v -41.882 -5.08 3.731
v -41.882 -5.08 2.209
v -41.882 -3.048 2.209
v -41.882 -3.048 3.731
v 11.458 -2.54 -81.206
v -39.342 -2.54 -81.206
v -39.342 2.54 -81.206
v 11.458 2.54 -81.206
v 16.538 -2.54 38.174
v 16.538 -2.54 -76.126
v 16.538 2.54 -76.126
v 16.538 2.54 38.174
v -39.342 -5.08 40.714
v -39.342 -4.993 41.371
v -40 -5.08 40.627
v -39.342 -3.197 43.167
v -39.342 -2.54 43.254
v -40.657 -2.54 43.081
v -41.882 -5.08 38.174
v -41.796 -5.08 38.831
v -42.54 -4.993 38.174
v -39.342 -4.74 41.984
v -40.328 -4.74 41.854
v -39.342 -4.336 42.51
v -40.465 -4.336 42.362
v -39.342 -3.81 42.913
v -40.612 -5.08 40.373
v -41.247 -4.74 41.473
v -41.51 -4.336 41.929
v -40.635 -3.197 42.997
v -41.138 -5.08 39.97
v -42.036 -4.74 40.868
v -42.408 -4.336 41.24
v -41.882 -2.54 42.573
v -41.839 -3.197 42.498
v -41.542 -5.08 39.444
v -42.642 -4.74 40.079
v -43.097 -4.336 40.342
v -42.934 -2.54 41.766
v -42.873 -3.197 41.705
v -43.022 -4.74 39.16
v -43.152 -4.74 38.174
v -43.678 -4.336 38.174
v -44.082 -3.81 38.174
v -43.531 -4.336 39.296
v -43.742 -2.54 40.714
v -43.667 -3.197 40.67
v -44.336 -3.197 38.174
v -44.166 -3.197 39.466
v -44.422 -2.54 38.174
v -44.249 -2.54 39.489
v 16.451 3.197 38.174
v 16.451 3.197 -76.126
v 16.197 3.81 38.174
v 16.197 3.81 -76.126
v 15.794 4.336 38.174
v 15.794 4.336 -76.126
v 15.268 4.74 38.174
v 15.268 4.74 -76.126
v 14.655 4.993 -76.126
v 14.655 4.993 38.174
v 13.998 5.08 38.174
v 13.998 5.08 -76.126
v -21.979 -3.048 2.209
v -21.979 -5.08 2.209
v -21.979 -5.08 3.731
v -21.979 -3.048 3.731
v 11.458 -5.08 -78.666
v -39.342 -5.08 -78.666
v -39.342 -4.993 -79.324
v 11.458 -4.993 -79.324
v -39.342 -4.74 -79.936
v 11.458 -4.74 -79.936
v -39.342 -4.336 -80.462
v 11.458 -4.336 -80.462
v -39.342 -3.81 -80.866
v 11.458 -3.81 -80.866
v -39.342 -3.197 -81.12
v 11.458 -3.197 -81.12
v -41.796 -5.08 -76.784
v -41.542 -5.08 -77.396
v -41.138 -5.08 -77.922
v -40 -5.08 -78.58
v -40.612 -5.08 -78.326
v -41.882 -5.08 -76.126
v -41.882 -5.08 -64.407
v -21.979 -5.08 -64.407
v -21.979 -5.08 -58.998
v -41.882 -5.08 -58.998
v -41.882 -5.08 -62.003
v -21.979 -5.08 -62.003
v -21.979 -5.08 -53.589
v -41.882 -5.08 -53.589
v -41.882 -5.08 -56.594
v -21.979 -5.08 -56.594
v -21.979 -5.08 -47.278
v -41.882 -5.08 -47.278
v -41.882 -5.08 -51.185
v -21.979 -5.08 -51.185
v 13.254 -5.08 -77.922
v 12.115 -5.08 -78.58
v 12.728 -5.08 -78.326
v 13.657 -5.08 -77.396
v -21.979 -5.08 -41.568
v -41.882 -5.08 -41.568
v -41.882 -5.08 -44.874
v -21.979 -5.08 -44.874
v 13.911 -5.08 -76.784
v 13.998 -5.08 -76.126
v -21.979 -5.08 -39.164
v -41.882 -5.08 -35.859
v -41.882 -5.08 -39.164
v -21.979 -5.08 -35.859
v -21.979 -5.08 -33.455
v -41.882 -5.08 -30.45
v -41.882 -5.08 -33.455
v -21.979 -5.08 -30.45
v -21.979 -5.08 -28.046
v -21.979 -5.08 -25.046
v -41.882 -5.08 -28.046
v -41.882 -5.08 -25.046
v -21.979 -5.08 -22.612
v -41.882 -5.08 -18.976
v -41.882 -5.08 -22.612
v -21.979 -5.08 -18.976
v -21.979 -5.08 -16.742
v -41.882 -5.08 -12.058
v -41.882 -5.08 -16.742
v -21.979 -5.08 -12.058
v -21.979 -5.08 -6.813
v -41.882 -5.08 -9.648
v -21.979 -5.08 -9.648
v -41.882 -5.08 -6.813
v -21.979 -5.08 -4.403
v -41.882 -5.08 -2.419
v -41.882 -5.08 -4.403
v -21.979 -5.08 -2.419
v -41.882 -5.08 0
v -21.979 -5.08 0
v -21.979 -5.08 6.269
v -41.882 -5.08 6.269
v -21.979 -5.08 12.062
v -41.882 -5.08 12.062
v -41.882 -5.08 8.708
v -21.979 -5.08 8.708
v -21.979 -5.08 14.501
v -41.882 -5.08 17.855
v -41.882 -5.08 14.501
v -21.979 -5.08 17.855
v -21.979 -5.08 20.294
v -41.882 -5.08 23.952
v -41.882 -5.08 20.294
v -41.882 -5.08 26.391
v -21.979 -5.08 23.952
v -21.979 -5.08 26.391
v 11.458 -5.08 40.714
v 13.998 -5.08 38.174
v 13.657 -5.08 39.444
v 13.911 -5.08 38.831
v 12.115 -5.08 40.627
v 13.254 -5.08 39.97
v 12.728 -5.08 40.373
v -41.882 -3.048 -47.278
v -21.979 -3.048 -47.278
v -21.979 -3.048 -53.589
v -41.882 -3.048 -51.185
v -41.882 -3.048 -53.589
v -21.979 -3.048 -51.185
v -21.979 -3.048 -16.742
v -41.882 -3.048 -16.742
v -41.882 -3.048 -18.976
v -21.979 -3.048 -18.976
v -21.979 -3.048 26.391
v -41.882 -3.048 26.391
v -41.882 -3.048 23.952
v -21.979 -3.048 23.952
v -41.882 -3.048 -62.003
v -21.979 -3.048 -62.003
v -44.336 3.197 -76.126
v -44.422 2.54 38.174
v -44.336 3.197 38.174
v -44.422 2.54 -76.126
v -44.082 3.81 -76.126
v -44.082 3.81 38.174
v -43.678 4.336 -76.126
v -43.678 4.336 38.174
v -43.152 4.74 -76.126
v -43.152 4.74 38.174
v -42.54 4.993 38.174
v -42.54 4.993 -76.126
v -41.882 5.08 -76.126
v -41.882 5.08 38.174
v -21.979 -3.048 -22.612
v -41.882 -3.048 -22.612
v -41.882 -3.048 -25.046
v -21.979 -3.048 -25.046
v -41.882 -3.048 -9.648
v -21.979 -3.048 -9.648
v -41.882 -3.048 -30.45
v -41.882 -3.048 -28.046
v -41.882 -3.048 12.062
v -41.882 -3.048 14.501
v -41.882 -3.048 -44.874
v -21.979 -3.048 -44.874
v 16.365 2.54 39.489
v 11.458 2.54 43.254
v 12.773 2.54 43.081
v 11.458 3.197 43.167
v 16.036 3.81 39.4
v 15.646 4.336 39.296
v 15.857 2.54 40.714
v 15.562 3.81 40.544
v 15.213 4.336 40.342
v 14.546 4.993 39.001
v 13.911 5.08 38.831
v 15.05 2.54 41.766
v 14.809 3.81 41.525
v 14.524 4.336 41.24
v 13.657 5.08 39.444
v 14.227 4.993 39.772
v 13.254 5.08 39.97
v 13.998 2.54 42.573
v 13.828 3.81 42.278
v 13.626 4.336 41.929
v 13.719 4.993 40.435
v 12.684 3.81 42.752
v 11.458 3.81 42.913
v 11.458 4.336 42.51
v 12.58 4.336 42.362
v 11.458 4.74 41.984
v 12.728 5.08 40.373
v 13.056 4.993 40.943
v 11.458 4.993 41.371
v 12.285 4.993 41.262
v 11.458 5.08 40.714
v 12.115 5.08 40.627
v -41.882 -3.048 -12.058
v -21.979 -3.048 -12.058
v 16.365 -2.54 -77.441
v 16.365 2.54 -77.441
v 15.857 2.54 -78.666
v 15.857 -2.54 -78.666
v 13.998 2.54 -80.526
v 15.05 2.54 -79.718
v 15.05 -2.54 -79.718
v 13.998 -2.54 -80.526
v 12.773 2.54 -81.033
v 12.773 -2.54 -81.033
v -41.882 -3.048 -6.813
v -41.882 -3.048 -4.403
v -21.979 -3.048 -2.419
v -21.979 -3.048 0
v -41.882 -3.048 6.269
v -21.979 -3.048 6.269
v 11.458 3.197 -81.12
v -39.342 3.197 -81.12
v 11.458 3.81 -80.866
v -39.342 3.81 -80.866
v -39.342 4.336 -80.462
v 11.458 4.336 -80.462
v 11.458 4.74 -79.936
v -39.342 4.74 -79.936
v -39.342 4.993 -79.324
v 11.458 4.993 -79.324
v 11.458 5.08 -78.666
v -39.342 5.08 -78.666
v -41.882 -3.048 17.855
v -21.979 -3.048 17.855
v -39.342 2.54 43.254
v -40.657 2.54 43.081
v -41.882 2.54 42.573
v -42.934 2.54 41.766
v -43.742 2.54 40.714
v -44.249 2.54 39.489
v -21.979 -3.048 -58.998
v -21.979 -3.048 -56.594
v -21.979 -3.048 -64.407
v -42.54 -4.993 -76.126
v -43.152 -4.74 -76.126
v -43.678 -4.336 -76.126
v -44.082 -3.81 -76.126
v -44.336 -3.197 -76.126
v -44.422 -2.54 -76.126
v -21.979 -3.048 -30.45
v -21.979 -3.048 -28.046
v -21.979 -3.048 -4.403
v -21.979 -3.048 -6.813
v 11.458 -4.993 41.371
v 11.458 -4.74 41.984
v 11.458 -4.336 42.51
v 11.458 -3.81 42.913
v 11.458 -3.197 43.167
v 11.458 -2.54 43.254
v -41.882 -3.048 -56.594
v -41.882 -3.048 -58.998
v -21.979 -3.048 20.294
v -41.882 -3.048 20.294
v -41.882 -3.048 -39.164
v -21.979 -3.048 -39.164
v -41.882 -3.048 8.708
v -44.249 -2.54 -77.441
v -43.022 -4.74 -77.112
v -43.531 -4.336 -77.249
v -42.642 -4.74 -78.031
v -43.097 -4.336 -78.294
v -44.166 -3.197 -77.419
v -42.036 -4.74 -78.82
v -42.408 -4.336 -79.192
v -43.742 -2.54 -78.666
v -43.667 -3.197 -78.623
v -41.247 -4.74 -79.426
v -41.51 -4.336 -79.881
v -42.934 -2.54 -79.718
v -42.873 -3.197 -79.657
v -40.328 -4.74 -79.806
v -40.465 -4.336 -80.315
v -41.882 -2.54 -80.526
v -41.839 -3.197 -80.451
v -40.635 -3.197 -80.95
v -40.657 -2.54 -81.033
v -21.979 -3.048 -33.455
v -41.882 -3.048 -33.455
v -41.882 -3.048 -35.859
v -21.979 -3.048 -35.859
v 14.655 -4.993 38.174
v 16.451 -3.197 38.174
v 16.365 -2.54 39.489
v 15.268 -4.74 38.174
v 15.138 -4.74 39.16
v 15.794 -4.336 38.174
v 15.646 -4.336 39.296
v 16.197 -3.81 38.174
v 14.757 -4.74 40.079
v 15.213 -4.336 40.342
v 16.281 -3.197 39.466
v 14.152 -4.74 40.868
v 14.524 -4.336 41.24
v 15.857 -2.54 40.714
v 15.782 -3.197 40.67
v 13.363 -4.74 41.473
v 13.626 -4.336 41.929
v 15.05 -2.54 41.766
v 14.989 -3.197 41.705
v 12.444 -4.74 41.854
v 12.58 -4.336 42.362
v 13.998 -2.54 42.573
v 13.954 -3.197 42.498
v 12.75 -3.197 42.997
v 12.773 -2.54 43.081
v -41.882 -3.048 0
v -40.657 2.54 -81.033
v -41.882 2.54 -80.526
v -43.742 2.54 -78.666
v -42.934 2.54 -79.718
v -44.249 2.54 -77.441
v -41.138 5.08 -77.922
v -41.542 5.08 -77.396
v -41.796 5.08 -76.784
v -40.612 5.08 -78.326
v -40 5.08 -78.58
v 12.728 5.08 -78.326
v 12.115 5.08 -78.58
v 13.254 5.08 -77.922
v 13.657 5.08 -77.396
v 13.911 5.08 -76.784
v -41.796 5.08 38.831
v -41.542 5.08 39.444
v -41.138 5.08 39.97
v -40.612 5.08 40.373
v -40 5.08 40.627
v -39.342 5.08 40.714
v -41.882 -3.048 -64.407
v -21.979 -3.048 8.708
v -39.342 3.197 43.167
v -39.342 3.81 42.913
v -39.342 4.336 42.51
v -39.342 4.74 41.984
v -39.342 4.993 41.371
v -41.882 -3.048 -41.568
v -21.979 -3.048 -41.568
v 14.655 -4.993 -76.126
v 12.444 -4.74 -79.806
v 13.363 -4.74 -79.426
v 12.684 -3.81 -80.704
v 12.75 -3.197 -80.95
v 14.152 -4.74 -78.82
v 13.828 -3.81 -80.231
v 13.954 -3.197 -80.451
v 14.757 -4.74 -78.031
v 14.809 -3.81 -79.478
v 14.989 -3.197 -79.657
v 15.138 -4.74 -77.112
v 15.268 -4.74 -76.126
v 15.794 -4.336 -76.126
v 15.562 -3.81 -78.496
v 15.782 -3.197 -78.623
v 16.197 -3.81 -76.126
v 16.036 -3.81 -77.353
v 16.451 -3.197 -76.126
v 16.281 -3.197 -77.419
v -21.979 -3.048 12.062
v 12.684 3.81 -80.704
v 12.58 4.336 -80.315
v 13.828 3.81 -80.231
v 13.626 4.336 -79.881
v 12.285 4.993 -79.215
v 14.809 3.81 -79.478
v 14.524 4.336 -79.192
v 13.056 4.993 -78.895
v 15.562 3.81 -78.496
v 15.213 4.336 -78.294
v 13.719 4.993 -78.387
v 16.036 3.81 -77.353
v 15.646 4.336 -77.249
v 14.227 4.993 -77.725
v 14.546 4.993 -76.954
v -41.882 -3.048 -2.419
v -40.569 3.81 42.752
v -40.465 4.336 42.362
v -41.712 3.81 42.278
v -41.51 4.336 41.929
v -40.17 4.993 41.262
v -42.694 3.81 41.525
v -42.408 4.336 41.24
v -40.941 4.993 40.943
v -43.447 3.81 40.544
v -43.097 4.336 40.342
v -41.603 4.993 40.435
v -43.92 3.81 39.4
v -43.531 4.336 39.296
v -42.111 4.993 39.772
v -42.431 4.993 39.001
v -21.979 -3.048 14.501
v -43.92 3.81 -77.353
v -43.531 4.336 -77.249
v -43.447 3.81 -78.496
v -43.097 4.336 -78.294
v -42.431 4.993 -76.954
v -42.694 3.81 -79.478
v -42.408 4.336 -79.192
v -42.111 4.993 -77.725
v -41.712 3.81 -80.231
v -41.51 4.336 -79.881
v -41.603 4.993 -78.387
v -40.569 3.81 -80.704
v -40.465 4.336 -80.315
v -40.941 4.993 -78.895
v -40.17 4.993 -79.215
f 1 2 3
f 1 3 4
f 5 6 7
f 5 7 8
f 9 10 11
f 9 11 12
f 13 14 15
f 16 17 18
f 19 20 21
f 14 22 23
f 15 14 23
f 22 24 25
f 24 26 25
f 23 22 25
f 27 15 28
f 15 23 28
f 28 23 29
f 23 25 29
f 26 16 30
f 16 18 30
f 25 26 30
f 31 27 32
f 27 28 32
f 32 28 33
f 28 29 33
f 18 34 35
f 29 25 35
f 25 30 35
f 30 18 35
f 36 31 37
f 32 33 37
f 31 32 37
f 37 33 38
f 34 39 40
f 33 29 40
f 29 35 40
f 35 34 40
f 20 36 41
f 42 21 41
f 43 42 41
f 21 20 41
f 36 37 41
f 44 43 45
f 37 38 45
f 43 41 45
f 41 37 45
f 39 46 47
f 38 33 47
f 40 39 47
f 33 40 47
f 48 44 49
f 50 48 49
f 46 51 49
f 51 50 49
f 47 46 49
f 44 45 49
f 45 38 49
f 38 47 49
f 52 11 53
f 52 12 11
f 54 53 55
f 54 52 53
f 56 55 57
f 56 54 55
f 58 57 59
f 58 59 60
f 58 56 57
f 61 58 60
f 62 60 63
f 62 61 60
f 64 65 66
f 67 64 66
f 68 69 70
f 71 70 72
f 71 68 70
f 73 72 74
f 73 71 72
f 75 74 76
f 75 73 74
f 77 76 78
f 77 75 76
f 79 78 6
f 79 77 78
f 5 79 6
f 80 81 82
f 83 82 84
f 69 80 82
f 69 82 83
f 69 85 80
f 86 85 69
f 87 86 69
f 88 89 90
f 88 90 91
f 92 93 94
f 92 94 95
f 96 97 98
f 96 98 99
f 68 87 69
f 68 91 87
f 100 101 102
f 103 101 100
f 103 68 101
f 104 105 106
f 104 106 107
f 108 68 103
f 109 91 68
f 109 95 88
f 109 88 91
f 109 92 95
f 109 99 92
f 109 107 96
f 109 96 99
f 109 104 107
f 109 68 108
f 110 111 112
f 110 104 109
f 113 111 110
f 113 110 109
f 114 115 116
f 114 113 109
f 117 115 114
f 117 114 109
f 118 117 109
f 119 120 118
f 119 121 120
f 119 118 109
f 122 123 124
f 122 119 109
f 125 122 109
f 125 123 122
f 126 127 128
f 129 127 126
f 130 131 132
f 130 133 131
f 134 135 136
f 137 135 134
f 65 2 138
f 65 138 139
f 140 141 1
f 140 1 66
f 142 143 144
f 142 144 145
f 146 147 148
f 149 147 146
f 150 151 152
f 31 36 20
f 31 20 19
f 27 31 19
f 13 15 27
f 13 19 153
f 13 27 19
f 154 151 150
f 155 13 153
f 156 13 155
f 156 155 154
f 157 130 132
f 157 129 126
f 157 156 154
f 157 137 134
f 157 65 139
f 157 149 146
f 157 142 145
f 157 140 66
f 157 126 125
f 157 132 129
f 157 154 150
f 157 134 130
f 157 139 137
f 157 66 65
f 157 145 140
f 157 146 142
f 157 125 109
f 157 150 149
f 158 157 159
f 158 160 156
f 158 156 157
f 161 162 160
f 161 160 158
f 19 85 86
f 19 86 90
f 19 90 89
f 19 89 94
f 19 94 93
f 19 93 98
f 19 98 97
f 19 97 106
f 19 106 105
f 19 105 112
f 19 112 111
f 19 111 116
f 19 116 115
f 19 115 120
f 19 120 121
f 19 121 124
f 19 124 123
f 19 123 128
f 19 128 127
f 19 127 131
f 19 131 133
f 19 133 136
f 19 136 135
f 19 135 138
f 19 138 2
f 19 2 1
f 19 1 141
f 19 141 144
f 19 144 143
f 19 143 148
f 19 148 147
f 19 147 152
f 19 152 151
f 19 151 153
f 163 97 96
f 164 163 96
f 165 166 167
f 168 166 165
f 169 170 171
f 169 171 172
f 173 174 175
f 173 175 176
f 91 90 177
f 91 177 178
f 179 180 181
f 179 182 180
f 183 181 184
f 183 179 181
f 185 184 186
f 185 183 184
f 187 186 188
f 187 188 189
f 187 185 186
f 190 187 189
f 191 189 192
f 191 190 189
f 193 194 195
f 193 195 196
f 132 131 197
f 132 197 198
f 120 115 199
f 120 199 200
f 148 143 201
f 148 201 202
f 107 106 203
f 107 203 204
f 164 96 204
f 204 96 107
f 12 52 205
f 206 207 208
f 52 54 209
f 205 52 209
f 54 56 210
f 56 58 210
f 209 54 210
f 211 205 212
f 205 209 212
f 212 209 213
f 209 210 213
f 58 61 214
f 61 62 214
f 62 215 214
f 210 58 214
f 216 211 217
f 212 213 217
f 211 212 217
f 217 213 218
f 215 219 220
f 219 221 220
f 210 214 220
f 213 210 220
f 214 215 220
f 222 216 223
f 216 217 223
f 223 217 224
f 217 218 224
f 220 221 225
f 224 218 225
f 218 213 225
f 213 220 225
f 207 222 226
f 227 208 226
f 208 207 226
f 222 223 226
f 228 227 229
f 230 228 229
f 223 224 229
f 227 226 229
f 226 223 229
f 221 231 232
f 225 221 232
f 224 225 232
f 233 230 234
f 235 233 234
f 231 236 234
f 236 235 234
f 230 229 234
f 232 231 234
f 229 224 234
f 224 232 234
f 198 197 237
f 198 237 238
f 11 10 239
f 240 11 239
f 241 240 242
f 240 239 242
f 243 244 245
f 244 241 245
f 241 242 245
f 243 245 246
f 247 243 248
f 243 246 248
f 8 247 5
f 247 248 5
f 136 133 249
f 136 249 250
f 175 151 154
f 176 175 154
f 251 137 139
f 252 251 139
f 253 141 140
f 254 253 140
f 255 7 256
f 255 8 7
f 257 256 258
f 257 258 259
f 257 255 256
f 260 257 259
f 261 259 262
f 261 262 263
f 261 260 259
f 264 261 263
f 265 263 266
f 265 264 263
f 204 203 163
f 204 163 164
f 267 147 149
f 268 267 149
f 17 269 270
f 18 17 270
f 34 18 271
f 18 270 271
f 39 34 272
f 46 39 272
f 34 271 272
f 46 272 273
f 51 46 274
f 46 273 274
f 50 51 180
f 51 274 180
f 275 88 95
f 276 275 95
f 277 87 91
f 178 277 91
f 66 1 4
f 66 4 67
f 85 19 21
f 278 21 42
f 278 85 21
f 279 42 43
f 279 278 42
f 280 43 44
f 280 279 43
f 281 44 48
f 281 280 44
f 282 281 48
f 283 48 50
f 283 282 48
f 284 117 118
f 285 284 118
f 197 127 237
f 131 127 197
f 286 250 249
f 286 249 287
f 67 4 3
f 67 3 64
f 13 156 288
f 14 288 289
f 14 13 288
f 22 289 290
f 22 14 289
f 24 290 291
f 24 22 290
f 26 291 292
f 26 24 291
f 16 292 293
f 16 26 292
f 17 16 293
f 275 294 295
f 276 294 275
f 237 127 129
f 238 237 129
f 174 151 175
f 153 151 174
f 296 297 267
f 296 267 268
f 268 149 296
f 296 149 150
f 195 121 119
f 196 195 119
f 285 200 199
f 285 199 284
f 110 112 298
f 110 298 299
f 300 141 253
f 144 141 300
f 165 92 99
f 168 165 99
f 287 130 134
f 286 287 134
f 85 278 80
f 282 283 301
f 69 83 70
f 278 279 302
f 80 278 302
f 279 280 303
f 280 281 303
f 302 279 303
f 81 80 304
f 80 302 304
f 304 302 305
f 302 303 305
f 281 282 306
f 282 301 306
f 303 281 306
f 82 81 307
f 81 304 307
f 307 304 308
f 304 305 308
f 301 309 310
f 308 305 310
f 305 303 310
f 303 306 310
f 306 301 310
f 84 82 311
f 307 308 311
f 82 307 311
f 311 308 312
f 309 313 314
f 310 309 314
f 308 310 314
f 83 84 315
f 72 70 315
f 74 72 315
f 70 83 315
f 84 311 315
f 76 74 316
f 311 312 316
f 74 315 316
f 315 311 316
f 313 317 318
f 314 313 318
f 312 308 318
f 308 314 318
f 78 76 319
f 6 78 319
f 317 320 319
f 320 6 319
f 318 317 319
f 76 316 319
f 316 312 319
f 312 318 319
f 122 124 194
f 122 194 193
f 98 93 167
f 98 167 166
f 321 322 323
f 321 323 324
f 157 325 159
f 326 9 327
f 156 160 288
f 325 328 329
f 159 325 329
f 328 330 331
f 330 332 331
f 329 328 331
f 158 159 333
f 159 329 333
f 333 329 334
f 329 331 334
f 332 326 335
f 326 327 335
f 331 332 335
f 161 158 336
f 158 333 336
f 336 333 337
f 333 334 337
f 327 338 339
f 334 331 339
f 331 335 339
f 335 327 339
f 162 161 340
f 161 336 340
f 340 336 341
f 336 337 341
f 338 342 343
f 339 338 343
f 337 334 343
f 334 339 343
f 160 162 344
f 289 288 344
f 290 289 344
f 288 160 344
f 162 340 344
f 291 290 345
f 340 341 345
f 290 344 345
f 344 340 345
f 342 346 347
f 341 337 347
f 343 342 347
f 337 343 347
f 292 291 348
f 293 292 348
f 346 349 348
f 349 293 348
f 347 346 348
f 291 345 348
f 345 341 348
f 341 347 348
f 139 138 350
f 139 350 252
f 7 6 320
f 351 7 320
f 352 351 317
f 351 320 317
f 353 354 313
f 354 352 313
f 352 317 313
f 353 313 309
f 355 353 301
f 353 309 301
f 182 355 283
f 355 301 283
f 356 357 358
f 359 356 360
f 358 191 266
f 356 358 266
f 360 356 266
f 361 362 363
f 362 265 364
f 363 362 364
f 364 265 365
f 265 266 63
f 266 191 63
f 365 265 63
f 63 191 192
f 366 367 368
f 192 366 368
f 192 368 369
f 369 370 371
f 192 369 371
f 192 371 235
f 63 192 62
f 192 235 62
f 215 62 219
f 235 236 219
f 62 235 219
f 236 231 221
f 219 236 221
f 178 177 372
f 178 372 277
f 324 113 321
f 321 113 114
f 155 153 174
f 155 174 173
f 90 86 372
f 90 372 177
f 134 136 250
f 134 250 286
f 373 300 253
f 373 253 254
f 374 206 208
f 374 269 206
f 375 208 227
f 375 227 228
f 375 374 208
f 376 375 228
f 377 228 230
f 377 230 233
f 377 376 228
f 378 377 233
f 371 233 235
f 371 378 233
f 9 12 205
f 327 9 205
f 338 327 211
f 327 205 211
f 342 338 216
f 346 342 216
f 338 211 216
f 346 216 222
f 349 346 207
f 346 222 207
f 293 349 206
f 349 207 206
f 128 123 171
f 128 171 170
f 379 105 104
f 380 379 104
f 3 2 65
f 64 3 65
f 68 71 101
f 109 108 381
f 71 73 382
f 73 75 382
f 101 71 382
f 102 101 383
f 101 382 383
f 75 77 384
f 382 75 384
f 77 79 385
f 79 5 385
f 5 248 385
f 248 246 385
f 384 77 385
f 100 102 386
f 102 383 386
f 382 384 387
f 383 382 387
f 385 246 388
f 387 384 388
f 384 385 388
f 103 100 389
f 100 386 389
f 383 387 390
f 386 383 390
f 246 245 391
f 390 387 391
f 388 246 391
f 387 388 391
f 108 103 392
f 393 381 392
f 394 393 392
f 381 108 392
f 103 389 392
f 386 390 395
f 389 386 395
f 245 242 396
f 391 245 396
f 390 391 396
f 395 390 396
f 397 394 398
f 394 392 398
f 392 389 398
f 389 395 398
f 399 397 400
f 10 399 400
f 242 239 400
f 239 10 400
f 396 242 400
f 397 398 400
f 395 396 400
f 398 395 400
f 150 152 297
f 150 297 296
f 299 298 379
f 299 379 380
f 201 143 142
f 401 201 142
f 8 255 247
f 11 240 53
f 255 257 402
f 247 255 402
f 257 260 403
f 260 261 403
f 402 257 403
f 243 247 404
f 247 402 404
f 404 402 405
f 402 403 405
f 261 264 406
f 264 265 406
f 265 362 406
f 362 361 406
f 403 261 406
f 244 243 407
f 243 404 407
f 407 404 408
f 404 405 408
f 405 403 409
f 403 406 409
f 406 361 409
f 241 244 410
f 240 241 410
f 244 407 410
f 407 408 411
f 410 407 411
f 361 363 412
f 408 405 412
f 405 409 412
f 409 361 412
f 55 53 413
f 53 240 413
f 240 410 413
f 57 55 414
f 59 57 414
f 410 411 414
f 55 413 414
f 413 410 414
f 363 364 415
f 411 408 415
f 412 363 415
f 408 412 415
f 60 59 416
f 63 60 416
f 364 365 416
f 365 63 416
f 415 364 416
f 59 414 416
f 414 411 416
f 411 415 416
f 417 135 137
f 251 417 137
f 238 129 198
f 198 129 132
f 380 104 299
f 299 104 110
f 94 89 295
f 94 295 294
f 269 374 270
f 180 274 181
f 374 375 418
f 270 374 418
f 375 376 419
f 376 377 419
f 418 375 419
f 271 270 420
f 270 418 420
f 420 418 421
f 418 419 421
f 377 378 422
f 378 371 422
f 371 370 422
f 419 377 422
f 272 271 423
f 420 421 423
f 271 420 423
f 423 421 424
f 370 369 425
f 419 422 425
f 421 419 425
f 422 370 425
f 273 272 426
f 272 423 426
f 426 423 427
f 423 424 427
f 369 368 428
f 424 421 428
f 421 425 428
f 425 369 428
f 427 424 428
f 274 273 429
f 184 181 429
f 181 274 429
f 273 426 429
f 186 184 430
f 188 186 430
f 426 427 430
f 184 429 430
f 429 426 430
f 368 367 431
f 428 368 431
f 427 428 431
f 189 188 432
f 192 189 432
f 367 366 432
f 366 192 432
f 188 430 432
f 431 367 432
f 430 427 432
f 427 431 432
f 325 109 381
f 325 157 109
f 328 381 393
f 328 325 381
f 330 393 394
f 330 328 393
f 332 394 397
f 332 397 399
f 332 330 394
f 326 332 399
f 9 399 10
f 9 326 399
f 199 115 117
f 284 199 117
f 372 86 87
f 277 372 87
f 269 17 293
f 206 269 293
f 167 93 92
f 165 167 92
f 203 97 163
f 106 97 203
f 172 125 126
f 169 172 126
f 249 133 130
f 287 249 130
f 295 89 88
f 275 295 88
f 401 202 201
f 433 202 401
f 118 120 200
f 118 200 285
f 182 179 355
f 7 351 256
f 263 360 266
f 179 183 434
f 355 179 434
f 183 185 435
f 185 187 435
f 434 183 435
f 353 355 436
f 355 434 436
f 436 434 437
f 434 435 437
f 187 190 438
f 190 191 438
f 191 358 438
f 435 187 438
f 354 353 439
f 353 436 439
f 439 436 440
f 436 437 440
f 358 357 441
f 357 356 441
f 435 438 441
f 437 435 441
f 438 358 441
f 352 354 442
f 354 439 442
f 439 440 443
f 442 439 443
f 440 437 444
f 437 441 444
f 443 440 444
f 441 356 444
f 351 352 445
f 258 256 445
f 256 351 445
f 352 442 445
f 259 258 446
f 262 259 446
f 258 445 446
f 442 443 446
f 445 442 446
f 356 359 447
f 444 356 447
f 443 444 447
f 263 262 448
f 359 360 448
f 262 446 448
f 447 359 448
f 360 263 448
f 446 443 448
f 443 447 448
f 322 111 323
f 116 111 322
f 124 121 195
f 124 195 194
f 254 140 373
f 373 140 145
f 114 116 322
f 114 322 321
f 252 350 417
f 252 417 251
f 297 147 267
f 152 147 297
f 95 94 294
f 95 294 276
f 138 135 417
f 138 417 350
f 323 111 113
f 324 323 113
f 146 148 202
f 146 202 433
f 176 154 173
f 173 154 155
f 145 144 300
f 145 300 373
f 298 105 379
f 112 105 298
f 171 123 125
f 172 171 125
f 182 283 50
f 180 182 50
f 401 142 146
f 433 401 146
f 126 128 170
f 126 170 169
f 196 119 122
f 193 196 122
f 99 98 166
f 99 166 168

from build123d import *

# Parameters (mm, degrees)
F0_W     = 60.96
F0_H     = 124.46
F1_DEPTH = 5.08
F2_R     = 5.08
F3_R     = 5.08
F4_R     = 5.08
F5_R     = 5.08
F6_R     = 2.54
F7_R     = 2.54
F8_W     = 19.903125
F8_H     = 2.43899
F8_H_2   = 2.438989
F8_H_3   = 1.521701
F8_H_4   = 2.418725
F8_H_5   = 2.409754
F8_H_6   = 2.409753
F8_H_7   = 2.234453
F8_H_8   = 2.434235
F8_H_9   = 2.404023
F8_H_10  = 2.404026
F8_H_11  = 2.404027
F8_H_12  = 2.404019
F9_DEPTH = 2.032


with BuildPart() as f1:
    # F0 (on Front) → F1 (new body, symmetric)
    with BuildSketch(Plane.XZ):
        with Locations((-13.942291, -18.97625)):
            Rectangle(F0_W, F0_H)
    extrude(amount=F1_DEPTH, both=True)

    # F2
    f2_edges = [f1.edges().sort_by_distance(p)[0] for p in [
        (16.537709, 0, 43.25375),
    ]]
    fillet(f2_edges, radius=F2_R)

    # F3
    f3_edges = [f1.edges().sort_by_distance(p)[0] for p in [
        (-44.422291, 0, 43.25375),
    ]]
    fillet(f3_edges, radius=F3_R)

    # F4
    f4_edges = [f1.edges().sort_by_distance(p)[0] for p in [
        (16.537709, 0, -81.20625),
    ]]
    fillet(f4_edges, radius=F4_R)

    # F5
    f5_edges = [f1.edges().sort_by_distance(p)[0] for p in [
        (-44.422291, 0, -81.20625),
    ]]
    fillet(f5_edges, radius=F5_R)

    # F6
    f6_edges = [f1.edges().sort_by_distance(p)[0] for p in [
        (16.537709, -5.08, -18.97625),
    ]]
    fillet(f6_edges, radius=F6_R)

    # F7
    f7_edges = [f1.edges().sort_by_distance(p)[0] for p in [
        (16.537709, 5.08, -18.97625),
    ]]
    fillet(f7_edges, radius=F7_R)

    # F8 (on face) → F9 (cut)
    with BuildSketch(Plane.XZ.offset(5.08)):
        with Locations((-31.930728, 25.17156)):
            Rectangle(F8_W, F8_H)
        with Locations((-31.930728, 19.074085)):
            Rectangle(F8_W, F8_H)
        with Locations((-31.930728, 13.281484)):
            Rectangle(F8_W, F8_H_2)
        with Locations((-31.930728, 7.488883)):
            Rectangle(F8_W, F8_H)
        with Locations((-31.930728, 2.969836)):
            Rectangle(F8_W, F8_H_3)
        with Locations((-31.930728, -1.209362)):
            Rectangle(F8_W, F8_H_4)
        with Locations((-31.930728, -5.608104)):
            Rectangle(F8_W, F8_H_5)
        with Locations((-31.930728, -10.852863)):
            Rectangle(F8_W, F8_H_6)
        with Locations((-31.930728, -17.859023)):
            Rectangle(F8_W, F8_H_7)
        with Locations((-31.930728, -23.828854)):
            Rectangle(F8_W, F8_H_8)
        with Locations((-31.930728, -29.247876)):
            Rectangle(F8_W, F8_H_9)
        with Locations((-31.930728, -34.656925)):
            Rectangle(F8_W, F8_H_9)
        with Locations((-31.930728, -40.36648)):
            Rectangle(F8_W, F8_H_9)
        with Locations((-31.930728, -46.076036)):
            Rectangle(F8_W, F8_H_9)
        with Locations((-31.930728, -52.386593)):
            Rectangle(F8_W, F8_H_10)
        with Locations((-31.930728, -57.795643)):
            Rectangle(F8_W, F8_H_11)
        with Locations((-31.930728, -63.204698)):
            Rectangle(F8_W, F8_H_12)
    extrude(amount=-F9_DEPTH, mode=Mode.SUBTRACT)


solid = f1.part
